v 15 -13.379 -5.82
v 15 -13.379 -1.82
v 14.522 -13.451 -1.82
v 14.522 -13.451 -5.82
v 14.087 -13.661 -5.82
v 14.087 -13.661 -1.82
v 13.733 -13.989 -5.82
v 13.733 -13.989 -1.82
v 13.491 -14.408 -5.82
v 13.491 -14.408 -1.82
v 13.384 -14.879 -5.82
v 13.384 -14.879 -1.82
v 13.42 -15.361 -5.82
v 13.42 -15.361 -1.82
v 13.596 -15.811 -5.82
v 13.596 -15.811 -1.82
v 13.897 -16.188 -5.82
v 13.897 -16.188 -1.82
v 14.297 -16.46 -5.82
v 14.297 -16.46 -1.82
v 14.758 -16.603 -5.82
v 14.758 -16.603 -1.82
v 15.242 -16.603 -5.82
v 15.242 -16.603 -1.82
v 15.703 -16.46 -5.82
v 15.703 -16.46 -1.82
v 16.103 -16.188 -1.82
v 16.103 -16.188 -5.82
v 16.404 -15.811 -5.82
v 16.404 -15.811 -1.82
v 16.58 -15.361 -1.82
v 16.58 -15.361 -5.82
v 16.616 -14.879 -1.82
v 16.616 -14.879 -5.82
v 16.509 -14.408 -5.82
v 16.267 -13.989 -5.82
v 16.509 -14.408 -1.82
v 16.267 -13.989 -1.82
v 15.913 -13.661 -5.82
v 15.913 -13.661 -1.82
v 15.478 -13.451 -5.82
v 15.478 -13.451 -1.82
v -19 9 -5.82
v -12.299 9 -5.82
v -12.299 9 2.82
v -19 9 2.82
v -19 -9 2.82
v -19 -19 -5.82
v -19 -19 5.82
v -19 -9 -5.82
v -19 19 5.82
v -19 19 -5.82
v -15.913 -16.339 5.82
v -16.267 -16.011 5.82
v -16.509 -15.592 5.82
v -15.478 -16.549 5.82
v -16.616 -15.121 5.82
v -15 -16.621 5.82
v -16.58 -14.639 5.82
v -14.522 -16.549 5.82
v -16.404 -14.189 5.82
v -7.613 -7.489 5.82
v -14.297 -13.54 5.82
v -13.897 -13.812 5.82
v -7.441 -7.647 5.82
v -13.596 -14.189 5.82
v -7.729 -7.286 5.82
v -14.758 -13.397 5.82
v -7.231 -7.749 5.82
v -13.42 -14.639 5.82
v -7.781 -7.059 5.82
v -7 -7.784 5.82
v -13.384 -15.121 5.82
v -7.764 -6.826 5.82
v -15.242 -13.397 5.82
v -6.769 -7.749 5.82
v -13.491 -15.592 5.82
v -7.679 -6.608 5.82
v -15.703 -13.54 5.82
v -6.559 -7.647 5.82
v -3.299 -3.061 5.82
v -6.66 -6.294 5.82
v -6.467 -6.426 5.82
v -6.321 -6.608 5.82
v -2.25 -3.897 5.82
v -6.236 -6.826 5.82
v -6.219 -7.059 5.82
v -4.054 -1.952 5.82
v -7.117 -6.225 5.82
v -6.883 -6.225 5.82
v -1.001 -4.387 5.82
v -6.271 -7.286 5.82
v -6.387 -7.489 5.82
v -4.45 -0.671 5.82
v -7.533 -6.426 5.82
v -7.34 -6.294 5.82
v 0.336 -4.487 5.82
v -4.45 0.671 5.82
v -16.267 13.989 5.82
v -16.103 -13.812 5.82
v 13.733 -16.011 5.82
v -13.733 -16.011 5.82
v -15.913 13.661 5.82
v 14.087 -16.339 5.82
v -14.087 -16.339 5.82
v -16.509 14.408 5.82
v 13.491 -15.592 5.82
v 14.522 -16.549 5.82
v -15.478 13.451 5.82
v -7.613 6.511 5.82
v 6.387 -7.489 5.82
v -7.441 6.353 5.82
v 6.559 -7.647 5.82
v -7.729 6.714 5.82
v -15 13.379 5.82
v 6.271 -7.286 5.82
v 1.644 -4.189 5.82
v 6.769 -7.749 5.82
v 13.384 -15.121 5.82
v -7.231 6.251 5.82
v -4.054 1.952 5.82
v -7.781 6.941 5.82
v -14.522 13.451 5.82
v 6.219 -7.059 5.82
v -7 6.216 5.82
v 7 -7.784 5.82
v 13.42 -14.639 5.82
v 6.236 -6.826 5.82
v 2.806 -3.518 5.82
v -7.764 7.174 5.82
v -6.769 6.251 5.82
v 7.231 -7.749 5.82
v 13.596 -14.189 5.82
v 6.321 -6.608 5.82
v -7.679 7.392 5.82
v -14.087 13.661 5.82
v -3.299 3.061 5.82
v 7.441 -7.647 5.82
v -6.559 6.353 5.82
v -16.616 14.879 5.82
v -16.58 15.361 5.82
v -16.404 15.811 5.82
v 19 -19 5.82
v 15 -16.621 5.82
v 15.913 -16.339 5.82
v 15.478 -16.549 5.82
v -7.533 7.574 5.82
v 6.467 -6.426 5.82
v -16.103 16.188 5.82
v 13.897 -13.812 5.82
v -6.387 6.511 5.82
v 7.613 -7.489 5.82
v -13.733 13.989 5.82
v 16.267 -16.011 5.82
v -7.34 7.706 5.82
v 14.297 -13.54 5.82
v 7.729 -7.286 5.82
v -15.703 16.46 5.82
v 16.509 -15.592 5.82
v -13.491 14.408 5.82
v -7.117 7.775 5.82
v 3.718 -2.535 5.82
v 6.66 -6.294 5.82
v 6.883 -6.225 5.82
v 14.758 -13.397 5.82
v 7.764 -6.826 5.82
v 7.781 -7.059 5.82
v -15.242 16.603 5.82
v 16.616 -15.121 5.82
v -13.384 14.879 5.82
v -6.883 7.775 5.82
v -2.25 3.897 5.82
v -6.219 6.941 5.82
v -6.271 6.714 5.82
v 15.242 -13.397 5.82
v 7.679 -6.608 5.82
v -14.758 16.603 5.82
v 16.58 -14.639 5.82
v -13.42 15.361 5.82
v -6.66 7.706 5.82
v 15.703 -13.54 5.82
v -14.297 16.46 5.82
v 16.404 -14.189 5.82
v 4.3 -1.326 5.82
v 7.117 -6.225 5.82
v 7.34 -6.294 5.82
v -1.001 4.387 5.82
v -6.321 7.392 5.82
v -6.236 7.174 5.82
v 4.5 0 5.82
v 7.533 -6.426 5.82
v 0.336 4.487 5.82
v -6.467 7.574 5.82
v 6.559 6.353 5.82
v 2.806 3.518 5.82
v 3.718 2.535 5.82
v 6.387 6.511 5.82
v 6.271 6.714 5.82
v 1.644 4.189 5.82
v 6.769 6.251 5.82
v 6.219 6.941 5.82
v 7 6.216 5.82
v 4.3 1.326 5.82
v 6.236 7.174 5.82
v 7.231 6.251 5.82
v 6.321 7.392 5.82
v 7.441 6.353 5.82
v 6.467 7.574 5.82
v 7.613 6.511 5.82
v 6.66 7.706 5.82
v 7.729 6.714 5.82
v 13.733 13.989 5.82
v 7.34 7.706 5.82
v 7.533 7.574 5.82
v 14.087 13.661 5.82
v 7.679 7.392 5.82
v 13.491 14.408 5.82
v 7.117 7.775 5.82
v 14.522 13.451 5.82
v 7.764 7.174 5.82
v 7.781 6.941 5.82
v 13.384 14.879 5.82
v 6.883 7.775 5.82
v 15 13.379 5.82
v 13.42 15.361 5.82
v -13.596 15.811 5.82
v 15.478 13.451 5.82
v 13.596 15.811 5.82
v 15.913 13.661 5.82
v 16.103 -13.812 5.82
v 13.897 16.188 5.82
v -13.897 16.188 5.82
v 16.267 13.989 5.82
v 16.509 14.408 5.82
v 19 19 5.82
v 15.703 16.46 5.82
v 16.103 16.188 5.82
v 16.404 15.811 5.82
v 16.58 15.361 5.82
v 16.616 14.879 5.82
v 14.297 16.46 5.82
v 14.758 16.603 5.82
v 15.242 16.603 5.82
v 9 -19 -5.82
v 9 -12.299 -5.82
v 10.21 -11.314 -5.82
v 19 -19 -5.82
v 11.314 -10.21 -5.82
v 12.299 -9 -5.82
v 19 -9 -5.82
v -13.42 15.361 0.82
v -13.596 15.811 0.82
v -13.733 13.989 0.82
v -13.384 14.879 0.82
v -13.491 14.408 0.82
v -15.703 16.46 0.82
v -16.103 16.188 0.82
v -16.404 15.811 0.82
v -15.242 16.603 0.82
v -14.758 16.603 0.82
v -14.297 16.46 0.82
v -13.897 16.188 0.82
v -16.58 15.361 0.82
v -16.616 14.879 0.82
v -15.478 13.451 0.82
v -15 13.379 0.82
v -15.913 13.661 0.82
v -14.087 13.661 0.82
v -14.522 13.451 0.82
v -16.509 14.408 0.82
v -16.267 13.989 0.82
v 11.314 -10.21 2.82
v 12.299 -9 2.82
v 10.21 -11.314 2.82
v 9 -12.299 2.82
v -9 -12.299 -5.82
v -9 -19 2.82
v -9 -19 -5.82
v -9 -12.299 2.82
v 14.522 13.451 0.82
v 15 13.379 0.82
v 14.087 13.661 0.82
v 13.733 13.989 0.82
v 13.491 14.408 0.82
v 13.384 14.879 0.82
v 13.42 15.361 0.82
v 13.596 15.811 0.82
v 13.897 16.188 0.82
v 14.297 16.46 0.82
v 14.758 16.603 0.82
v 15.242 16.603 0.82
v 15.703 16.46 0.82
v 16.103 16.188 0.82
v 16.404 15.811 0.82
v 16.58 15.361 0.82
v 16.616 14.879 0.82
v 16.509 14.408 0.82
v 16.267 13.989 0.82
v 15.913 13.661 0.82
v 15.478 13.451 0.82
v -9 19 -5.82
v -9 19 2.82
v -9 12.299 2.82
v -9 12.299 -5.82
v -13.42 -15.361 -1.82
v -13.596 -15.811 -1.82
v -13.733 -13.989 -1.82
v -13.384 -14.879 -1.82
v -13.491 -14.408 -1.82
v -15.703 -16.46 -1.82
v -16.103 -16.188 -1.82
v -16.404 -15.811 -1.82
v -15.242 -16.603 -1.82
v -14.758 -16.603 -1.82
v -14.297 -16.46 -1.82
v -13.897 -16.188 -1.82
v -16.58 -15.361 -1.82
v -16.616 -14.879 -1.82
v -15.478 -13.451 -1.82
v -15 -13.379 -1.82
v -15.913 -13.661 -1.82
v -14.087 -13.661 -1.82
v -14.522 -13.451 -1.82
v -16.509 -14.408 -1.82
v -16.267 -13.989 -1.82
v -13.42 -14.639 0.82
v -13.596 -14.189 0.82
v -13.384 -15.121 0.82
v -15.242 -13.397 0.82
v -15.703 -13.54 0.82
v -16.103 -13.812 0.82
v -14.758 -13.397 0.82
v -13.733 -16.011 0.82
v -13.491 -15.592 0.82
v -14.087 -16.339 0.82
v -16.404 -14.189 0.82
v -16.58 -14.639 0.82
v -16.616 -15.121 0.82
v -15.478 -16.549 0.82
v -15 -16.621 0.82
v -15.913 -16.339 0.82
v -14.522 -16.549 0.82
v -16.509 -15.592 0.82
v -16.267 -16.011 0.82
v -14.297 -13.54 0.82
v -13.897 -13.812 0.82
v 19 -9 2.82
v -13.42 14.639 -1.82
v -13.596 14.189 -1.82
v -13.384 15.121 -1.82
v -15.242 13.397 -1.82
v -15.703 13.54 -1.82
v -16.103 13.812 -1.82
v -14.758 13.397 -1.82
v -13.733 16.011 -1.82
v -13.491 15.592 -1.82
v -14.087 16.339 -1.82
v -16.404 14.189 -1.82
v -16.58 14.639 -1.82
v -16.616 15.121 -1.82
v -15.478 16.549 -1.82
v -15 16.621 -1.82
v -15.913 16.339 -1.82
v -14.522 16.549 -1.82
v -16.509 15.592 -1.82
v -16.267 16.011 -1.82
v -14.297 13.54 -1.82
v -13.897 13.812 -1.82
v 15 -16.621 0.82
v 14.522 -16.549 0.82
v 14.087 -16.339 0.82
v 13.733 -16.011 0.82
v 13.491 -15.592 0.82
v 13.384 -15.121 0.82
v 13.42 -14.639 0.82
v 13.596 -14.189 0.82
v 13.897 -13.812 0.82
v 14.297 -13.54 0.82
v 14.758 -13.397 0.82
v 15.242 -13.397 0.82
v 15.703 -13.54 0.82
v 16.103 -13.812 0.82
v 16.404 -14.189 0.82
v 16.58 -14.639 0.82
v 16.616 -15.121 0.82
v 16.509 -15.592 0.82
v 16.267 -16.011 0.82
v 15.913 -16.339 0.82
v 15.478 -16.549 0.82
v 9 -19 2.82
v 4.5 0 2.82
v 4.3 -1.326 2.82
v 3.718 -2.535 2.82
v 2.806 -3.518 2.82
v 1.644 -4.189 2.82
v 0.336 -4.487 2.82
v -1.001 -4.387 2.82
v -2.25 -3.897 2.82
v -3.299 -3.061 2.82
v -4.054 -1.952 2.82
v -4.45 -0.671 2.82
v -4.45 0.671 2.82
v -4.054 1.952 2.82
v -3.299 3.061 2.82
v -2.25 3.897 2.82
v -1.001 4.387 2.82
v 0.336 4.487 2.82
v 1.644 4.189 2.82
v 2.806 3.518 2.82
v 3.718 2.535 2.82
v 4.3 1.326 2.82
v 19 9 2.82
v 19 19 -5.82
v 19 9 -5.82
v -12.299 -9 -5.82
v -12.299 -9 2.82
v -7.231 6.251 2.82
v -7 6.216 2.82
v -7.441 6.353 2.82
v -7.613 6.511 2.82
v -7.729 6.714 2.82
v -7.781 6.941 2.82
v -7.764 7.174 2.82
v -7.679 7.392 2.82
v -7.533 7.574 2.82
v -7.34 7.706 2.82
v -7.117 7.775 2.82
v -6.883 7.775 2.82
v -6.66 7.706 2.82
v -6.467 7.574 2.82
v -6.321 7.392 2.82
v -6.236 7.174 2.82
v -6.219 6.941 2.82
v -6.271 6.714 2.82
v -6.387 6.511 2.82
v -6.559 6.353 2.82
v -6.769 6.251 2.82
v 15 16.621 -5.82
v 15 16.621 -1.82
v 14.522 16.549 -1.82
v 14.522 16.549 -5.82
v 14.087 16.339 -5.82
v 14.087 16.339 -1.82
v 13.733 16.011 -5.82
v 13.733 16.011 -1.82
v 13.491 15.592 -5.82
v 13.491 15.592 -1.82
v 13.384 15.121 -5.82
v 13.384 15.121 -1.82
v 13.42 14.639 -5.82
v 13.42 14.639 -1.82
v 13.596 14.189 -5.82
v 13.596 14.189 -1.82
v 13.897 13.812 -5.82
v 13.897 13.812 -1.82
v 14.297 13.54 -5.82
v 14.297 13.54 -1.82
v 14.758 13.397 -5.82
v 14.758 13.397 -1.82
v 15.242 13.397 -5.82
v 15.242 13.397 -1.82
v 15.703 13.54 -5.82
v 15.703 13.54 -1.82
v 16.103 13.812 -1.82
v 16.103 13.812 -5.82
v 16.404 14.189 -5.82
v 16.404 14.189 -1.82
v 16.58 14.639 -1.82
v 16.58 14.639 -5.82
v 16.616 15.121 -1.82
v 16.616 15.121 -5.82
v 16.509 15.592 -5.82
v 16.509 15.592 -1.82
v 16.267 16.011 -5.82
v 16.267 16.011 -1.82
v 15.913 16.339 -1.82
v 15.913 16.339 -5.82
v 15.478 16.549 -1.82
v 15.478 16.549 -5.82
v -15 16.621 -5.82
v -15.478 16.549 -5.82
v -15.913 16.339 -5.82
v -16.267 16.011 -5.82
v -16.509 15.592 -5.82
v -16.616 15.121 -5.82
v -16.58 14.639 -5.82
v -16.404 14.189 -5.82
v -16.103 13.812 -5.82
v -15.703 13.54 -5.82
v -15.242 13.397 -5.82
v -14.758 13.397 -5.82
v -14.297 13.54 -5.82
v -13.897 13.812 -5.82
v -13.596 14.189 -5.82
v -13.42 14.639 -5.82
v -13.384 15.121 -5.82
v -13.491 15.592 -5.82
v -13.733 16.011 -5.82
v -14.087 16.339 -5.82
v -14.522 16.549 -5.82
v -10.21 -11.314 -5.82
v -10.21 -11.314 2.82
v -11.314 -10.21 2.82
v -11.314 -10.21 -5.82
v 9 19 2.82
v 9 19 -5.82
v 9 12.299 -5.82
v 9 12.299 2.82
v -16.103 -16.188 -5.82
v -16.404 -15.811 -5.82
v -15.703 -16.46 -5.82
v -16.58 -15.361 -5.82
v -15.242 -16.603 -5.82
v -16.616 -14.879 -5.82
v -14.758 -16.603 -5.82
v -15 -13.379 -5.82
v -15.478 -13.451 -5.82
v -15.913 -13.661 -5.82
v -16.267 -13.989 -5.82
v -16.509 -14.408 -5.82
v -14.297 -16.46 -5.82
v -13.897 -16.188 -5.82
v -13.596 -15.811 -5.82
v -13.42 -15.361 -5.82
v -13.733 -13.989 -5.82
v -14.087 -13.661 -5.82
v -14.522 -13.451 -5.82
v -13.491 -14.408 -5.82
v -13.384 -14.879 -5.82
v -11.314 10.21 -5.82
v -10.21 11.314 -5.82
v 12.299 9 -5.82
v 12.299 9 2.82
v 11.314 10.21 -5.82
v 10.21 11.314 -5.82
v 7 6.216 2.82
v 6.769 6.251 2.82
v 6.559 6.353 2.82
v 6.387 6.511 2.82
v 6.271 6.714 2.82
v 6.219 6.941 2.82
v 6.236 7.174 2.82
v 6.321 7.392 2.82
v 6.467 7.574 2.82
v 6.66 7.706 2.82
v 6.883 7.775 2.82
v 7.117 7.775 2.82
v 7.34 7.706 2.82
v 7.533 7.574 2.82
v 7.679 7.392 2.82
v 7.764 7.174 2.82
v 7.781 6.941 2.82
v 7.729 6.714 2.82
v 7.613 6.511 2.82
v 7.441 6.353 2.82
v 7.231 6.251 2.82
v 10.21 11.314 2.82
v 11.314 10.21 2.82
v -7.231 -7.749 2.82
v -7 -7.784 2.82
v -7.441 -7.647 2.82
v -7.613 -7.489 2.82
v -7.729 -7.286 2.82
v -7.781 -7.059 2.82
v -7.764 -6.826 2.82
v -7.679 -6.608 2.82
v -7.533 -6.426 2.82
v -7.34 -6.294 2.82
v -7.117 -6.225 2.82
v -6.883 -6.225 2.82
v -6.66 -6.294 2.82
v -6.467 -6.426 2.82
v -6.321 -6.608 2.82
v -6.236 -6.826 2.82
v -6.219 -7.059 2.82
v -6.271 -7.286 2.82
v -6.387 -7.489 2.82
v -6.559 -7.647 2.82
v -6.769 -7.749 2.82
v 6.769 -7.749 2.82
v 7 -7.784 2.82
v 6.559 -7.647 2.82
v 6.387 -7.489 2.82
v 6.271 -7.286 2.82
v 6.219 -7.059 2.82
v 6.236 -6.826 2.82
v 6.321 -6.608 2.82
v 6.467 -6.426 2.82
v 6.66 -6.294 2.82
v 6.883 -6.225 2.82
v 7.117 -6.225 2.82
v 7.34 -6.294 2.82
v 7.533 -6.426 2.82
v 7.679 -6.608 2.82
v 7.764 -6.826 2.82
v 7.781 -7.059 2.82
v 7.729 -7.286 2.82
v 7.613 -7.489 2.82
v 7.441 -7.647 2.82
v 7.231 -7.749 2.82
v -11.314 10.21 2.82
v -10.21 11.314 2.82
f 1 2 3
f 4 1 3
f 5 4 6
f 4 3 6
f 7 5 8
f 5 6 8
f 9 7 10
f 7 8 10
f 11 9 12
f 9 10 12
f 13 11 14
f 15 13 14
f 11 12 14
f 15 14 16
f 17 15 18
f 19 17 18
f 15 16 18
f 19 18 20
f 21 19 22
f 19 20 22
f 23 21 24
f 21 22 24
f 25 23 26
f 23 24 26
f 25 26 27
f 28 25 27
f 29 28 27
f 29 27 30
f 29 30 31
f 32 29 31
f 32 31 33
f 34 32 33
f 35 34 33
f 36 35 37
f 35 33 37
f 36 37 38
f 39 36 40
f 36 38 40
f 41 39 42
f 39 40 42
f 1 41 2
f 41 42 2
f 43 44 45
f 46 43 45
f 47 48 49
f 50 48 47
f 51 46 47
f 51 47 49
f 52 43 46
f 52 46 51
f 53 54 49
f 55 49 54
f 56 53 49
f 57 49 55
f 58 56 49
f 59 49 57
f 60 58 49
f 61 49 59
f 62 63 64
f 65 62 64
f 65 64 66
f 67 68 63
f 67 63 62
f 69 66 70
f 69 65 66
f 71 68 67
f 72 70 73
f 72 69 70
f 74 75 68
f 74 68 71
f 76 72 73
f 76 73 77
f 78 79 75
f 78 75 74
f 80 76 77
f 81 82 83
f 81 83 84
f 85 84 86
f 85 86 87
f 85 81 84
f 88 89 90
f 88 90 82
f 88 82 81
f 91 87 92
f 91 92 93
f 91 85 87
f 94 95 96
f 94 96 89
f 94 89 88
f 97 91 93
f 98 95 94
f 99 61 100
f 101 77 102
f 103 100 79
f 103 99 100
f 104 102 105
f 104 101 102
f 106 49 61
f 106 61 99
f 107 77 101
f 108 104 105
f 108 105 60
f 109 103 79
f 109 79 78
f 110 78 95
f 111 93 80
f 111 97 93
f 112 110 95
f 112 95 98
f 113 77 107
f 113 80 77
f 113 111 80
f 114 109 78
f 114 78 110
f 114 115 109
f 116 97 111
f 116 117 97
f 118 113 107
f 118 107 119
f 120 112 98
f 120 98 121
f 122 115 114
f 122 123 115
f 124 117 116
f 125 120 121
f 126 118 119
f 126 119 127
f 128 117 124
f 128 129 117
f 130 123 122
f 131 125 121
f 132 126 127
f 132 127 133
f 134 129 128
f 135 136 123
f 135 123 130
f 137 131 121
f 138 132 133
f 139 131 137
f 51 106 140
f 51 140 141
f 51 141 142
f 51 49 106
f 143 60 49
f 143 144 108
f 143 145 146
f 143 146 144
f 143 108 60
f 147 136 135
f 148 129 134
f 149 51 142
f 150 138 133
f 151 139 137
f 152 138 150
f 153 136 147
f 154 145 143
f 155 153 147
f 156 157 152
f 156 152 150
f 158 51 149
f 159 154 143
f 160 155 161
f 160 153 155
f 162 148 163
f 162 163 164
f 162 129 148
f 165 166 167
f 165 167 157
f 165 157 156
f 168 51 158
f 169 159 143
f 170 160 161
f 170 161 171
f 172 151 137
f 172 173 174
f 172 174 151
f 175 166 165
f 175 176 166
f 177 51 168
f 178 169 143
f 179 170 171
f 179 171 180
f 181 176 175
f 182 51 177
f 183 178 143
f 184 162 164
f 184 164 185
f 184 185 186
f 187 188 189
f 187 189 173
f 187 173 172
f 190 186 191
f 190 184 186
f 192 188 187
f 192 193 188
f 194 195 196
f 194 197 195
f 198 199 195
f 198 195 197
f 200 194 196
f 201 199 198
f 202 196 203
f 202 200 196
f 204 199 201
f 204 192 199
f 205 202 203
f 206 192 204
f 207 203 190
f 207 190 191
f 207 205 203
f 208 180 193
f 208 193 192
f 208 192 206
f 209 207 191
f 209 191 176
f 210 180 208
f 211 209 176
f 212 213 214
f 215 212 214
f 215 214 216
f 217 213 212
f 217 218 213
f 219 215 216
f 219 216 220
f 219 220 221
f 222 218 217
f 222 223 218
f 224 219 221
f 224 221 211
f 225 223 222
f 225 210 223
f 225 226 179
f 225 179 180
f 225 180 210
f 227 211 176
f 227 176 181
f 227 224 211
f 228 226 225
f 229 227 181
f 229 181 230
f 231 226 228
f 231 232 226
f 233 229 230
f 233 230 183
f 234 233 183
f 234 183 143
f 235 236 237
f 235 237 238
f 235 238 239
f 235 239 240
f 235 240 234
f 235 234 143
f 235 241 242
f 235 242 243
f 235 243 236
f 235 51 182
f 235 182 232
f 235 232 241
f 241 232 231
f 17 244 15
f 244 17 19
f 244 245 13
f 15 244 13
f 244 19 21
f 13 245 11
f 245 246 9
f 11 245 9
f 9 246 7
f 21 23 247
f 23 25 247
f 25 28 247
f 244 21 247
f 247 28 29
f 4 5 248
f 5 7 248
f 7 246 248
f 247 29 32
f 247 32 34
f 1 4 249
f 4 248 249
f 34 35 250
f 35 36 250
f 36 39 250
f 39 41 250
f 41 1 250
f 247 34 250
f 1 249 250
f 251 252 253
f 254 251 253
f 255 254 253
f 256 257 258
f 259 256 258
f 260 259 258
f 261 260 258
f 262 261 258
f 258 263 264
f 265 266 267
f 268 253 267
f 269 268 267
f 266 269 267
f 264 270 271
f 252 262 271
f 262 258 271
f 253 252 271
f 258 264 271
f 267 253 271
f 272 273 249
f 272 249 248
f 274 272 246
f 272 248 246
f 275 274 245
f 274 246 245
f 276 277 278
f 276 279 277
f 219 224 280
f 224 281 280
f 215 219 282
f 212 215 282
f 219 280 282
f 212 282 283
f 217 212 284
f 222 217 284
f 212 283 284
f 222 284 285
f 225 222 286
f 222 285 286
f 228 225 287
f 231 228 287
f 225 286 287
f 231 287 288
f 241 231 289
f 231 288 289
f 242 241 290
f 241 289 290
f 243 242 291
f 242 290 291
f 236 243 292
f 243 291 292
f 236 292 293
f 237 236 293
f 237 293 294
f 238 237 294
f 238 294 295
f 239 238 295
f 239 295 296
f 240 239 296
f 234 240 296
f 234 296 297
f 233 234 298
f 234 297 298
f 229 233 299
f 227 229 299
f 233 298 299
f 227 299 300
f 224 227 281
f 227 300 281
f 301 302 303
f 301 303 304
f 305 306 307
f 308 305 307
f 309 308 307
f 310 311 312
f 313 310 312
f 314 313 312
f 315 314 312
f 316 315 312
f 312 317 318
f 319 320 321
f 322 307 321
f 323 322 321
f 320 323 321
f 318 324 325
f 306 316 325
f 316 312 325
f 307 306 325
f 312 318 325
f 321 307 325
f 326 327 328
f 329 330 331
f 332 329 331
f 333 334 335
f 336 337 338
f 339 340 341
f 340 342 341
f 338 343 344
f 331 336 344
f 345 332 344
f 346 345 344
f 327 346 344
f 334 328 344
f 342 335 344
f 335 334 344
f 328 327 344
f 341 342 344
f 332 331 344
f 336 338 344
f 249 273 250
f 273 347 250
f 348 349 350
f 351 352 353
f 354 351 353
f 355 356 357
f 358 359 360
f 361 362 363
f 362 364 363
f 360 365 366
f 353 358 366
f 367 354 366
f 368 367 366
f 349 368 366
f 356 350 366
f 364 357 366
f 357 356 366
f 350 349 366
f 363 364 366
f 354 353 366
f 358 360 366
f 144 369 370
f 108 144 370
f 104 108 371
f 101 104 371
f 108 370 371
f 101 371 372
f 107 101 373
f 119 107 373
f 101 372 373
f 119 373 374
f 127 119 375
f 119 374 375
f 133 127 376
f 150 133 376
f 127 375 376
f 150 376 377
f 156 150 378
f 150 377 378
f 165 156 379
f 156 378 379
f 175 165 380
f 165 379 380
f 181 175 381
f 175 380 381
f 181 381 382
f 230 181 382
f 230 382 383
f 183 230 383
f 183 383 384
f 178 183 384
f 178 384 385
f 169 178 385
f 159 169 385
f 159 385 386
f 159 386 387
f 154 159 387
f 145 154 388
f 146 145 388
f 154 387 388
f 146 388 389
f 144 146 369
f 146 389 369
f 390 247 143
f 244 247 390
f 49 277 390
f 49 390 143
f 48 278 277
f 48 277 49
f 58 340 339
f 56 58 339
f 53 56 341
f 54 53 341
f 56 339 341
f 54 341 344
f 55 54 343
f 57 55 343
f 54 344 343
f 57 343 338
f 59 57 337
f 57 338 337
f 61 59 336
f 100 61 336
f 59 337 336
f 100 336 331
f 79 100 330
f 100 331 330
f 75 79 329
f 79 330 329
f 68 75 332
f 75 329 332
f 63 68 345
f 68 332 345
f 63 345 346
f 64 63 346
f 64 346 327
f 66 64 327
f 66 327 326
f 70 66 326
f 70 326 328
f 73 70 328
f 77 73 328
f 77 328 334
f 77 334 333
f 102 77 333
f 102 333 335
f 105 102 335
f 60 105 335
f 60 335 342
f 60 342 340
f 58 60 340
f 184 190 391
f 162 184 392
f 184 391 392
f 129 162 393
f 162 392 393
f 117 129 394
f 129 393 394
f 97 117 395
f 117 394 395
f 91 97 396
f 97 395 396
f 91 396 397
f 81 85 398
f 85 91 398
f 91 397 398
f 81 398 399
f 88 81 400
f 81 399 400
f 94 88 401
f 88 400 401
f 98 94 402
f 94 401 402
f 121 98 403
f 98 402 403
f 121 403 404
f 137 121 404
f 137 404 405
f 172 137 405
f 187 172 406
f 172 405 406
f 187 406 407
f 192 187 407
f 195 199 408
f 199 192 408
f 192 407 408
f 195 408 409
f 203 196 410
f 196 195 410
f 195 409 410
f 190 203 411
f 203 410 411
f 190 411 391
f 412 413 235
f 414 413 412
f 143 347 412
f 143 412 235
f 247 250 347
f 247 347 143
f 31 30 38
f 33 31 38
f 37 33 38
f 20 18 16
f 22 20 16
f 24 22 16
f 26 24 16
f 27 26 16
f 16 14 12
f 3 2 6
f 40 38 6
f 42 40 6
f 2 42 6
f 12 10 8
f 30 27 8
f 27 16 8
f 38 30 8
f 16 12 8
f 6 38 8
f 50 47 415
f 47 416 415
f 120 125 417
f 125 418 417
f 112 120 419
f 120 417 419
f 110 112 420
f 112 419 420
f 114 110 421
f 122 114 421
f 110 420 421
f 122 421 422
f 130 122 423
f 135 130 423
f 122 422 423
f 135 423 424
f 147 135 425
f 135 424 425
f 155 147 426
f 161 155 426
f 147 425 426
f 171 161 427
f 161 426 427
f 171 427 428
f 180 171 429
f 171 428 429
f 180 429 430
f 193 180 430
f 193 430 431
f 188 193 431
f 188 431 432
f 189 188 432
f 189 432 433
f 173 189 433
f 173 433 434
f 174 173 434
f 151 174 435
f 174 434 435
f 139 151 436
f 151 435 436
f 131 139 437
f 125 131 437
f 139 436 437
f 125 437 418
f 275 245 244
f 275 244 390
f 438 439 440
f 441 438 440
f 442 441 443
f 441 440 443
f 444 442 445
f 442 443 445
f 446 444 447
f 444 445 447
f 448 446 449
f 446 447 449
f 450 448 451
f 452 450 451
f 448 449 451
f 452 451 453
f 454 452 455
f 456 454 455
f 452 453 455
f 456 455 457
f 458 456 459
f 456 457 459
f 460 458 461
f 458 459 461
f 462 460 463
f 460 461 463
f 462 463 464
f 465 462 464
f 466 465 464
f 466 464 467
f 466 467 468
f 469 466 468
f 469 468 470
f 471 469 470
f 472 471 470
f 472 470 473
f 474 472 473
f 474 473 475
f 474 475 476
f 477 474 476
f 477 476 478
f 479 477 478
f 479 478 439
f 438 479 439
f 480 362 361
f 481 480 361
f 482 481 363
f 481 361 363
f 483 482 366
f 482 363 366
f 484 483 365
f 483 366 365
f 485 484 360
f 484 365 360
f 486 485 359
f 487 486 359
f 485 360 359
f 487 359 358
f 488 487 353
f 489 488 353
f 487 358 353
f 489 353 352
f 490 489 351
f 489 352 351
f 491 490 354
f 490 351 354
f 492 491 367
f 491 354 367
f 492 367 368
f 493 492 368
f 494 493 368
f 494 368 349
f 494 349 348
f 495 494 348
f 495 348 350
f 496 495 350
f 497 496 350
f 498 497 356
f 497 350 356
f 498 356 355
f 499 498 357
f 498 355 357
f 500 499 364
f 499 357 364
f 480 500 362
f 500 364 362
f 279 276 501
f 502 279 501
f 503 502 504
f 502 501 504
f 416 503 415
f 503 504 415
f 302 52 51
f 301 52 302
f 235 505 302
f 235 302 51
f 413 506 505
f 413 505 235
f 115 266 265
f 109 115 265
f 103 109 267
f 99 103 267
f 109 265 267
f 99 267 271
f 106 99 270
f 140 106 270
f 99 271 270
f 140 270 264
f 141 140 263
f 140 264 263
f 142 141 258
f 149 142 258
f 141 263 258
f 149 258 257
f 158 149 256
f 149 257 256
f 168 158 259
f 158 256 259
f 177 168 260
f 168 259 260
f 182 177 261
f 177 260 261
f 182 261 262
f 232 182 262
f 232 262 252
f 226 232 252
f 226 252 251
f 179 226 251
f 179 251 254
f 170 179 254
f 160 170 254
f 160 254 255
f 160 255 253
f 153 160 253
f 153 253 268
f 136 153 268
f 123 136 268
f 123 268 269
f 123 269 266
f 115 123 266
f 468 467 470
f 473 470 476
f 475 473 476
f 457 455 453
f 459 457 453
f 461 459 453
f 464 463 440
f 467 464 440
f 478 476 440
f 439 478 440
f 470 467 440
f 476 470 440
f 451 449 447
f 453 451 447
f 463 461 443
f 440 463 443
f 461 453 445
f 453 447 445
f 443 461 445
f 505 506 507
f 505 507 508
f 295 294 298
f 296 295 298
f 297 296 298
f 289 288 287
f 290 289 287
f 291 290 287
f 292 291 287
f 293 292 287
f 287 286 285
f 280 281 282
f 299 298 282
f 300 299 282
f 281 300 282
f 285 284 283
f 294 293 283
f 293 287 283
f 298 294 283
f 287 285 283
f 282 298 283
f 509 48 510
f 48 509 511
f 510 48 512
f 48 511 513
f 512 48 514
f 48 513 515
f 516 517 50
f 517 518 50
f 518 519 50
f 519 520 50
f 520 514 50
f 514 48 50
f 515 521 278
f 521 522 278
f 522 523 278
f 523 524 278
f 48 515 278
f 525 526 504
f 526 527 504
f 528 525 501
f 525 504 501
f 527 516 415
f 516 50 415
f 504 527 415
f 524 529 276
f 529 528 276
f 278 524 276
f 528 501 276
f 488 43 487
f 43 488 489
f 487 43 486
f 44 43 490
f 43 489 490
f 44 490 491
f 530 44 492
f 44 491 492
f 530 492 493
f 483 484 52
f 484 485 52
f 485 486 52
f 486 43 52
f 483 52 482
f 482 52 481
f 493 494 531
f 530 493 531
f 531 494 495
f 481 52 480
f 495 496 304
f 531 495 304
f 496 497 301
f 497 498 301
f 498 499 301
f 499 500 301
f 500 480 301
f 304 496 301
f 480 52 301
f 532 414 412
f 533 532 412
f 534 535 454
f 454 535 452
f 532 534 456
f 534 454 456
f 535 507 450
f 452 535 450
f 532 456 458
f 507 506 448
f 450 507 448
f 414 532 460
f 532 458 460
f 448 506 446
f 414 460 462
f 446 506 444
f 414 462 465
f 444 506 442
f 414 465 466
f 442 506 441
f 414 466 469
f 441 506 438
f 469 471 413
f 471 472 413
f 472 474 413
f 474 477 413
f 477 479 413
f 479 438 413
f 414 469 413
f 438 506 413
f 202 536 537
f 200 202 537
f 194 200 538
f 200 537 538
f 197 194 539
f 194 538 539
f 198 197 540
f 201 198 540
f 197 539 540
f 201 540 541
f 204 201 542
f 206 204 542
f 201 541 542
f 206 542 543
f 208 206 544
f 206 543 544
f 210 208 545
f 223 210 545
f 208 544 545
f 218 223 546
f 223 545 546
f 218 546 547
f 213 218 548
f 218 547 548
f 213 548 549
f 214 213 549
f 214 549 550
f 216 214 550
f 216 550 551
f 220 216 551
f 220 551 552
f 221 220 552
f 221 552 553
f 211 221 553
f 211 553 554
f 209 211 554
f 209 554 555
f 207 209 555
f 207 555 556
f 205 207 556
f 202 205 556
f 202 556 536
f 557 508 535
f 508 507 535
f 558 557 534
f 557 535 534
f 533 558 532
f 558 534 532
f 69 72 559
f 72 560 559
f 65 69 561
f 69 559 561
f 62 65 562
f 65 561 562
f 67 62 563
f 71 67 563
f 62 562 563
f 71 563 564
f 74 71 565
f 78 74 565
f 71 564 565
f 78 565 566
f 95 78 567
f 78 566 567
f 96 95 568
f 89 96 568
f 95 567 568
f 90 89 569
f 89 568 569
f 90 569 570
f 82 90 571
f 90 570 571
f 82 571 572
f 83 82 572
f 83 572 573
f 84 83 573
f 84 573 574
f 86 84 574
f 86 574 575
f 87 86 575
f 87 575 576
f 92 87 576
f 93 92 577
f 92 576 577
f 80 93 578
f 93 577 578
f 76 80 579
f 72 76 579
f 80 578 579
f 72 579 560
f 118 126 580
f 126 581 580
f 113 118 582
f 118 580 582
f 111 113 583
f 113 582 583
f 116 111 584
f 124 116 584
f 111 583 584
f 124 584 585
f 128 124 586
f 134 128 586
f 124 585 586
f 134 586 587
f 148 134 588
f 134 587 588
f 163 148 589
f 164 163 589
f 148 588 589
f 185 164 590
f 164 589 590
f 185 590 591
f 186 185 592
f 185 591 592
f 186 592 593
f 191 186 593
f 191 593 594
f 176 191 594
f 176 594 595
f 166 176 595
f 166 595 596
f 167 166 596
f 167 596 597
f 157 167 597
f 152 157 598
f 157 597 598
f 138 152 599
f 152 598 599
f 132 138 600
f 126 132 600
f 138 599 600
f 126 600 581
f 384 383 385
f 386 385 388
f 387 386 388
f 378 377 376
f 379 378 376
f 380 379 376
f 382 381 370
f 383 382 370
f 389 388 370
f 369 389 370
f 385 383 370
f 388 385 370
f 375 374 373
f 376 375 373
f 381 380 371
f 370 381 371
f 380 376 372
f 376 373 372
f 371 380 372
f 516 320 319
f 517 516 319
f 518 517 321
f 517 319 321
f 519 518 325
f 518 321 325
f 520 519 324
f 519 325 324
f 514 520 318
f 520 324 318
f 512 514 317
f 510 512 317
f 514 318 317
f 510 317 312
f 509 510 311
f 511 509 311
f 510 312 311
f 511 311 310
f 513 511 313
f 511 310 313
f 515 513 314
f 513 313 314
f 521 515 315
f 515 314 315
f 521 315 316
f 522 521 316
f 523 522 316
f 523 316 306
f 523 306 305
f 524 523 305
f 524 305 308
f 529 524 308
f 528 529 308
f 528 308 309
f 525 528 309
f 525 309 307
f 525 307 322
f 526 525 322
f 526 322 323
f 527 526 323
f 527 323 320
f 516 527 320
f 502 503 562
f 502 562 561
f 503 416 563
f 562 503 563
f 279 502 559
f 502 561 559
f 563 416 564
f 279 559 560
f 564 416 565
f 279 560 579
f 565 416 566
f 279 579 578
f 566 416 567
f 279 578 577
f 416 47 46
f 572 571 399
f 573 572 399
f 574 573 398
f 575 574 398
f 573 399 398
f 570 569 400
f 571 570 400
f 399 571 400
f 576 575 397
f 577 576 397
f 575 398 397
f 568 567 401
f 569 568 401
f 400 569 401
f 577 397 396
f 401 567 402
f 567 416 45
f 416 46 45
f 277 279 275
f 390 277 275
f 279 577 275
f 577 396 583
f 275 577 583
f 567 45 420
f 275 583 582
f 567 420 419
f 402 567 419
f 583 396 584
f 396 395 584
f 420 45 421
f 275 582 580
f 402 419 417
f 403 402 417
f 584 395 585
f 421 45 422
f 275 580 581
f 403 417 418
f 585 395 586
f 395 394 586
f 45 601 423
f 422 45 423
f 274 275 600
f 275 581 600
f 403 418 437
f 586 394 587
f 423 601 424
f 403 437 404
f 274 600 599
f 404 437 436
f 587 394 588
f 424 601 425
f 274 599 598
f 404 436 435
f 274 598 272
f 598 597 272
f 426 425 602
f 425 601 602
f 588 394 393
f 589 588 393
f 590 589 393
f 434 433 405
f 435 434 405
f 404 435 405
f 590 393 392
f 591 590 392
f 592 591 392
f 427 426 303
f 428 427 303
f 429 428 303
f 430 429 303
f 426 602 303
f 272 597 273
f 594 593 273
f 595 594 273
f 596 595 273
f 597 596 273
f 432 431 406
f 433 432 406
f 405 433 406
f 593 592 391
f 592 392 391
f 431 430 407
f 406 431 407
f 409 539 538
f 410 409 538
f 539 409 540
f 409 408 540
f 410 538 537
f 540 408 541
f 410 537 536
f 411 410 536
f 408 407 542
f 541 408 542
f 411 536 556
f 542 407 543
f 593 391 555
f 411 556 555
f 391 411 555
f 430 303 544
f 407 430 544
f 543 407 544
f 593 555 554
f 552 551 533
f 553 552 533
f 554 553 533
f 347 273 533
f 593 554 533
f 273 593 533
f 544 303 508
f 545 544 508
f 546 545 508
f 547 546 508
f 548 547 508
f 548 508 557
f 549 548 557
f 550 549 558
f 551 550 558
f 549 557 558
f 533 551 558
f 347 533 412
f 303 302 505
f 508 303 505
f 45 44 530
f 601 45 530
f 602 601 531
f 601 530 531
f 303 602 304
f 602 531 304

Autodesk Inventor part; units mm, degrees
ref_plane "YZ Plane" through (0, 0, 0) normal (1, 0, 0) x (0, 1, 0)
ref_plane "XZ Plane" through (0, 0, 0) normal (0, 1, 0) x (-1, 0, 0)
ref_plane "XY Plane" through (0, 0, 0) normal (0, 0, 1) x (1, 0, 0)
sketch "Sketch1" plane through (0, 0, 0) normal (0, 0, 1) x (1, 0, 0)
  line L0 (-19, 19) -> (19, 19)
  line L1 (19, 19) -> (19, -19)
  line L2 (19, -19) -> (-19, -19)
  line L3 (-19, -19) -> (-19, 19)
  line L4 (-19, 19) -> (19, -19) construction
  line L5 (19, 19) -> (-19, -19) construction
  circle A0 centre (0, 0) radius 4.5
  dimension "d0" = 38
  dimension "d1" = 38
  dimension "d2" = 9
extrude "Extrusion1" add sketch "Sketch1" along normal mid plane 11.64
sketch "Sketch4" plane through (0, 0, 5.82) normal (0, 0, 1) x (1, 0, 0)
  line L0 (-11.25, -11.25) -> (11.25, -11.25) construction
  line L1 (11.25, -11.25) -> (11.25, 11.25) construction
  line L2 (11.25, 11.25) -> (-11.25, 11.25) construction
  line L3 (-11.25, 11.25) -> (-11.25, -11.25) construction
  line L4 (-11.25, -11.25) -> (11.25, 11.25) construction
  line L5 (11.25, -11.25) -> (-11.25, 11.25) construction
  point P0 (0, 0)
  point P1 (-7, -7)
  point P2 (0, 0)
  point P3 (0, 0)
  point P4 (-7, 7)
  point P5 (7, -7)
  point P6 (7, 7)
  dimension "d17" = 22.5
  dimension "d18" = 22.5
  dimension "d47" = 7
  dimension "d48" = 7
  dimension "d51" = 14
  dimension "d54" = 14
sketch "Sketch5" plane through (0, 0, -5.82) normal (0, 0, -1) x (-1, 0, 0)
  circle A0 centre (0, 0) radius 4.5 projected
  circle A1 centre (0, 0) radius 15.24
  dimension "d19" = 30.48
extrude "Extrusion2" cut sketch "Sketch5" against normal blind 8.64 contours A0 | A1
sketch "Sketch6" plane through (-19, 19, 5.82) normal (0, 1, 0) x (1, 0, 0)
  line L0 (0, 11.64) -> (38, 11.64) projected
  line L1 (3.76, 3) -> (34.24, 3) projected
  line L2 (10, 11.64) -> (28, 11.64)
  line L3 (28, 11.64) -> (28, 3)
  line L4 (28, 3) -> (10, 3)
  line L5 (10, 3) -> (10, 11.64)
  line L6 (0, 11.64) -> (0, 0) projected
  line L7 (38, 11.64) -> (38, 0) projected
  point P0 (19, 5.82)
  point P1 (10, 3)
  dimension "d22" = 10
  dimension "d23" = 10
extrude "Extrusion3" cut sketch "Sketch6" against normal through all
sketch "Sketch7" plane through (19, -19, 5.82) normal (1, 0, 0) x (0, 0, -1)
  line L0 (11.64, 31.2987) -> (11.64, 6.7013) projected
  line L1 (3, 31.2987) -> (3, 6.7013) projected
  line L2 (11.64, 28) -> (3, 28)
  line L3 (3, 28) -> (3, 10)
  line L4 (3, 10) -> (11.64, 10)
  line L5 (11.64, 10) -> (11.64, 28)
  line L6 (11.64, 38) -> (0, 38) projected
  line L7 (11.64, 0) -> (0, 0) projected
  point P0 (5.82, 19)
  point P1 (11.64, 10)
  point P2 (3, 28)
  dimension "d26" = 10
  dimension "d27" = 10
extrude "Extrusion4" cut sketch "Sketch7" against normal through all
sketch "Sketch8" plane through (0, 0, -5.82) normal (0, 0, -1) x (-1, 0, 0)
  line L0 (-12.2987, -9) -> (-19, -9) projected
  line L1 (-19, -9) -> (-19, -19) projected
  line L2 (-19, -19) -> (-9, -19) projected
  line L3 (-9, -19) -> (-9, -12.2987) projected
  arc A0 (-12.2987, -9) -> (-9, -12.2987) centre (0, 0) ccw projected
  point P0 (-15, -15)
  point P1 (-15, 15)
  point P2 (15, -15)
  point P3 (15, 15)
  dimension "d30" = 15
  dimension "d31" = 15
  dimension "d34" = 30
  dimension "d37" = 30
hole "Hole1" at (15, -15, -5.82) at (15, 15, -5.82) at (-15, 15, -5.82) at (-15, -15, -5.82) direction (0, 0, 1) diameter 3.242 depth 4 thread size "M4x0.7" class "6H" standard "ANSI Metric M Profile"
hole "Hole2" at (-7, -7, 5.82) at (-7, 7, 5.82) at (7, -7, 5.82) at (7, 7, 5.82) direction (0, 0, -1) diameter 1.567 end through all thread size "M2x0.4" class "6H" standard "ANSI Metric M Profile"
sketch "Sketch9" plane through (0, 0, 5.82) normal (0, 0, 1) x (1, 0, 0)
  circle A0 centre (15, -15) radius 1.621 projected
  circle A1 centre (-15, -15) radius 1.621 projected
  circle A2 centre (-15, 15) radius 1.621 projected
  circle A3 centre (15, 15) radius 1.621 projected
  point P0 (0, 0)
hole "Hole3" at (15, -15, 5.82) at (-15, -15, 5.82) at (-15, 15, 5.82) at (15, 15, 5.82) direction (0, 0, -1) diameter 3.242 depth 5 thread size "M4x0.7" class "6H" standard "ANSI Metric M Profile"
equation "\"d1\" = d0"
equation "\"d18\" = d17"
properties part number "pmtbase"
